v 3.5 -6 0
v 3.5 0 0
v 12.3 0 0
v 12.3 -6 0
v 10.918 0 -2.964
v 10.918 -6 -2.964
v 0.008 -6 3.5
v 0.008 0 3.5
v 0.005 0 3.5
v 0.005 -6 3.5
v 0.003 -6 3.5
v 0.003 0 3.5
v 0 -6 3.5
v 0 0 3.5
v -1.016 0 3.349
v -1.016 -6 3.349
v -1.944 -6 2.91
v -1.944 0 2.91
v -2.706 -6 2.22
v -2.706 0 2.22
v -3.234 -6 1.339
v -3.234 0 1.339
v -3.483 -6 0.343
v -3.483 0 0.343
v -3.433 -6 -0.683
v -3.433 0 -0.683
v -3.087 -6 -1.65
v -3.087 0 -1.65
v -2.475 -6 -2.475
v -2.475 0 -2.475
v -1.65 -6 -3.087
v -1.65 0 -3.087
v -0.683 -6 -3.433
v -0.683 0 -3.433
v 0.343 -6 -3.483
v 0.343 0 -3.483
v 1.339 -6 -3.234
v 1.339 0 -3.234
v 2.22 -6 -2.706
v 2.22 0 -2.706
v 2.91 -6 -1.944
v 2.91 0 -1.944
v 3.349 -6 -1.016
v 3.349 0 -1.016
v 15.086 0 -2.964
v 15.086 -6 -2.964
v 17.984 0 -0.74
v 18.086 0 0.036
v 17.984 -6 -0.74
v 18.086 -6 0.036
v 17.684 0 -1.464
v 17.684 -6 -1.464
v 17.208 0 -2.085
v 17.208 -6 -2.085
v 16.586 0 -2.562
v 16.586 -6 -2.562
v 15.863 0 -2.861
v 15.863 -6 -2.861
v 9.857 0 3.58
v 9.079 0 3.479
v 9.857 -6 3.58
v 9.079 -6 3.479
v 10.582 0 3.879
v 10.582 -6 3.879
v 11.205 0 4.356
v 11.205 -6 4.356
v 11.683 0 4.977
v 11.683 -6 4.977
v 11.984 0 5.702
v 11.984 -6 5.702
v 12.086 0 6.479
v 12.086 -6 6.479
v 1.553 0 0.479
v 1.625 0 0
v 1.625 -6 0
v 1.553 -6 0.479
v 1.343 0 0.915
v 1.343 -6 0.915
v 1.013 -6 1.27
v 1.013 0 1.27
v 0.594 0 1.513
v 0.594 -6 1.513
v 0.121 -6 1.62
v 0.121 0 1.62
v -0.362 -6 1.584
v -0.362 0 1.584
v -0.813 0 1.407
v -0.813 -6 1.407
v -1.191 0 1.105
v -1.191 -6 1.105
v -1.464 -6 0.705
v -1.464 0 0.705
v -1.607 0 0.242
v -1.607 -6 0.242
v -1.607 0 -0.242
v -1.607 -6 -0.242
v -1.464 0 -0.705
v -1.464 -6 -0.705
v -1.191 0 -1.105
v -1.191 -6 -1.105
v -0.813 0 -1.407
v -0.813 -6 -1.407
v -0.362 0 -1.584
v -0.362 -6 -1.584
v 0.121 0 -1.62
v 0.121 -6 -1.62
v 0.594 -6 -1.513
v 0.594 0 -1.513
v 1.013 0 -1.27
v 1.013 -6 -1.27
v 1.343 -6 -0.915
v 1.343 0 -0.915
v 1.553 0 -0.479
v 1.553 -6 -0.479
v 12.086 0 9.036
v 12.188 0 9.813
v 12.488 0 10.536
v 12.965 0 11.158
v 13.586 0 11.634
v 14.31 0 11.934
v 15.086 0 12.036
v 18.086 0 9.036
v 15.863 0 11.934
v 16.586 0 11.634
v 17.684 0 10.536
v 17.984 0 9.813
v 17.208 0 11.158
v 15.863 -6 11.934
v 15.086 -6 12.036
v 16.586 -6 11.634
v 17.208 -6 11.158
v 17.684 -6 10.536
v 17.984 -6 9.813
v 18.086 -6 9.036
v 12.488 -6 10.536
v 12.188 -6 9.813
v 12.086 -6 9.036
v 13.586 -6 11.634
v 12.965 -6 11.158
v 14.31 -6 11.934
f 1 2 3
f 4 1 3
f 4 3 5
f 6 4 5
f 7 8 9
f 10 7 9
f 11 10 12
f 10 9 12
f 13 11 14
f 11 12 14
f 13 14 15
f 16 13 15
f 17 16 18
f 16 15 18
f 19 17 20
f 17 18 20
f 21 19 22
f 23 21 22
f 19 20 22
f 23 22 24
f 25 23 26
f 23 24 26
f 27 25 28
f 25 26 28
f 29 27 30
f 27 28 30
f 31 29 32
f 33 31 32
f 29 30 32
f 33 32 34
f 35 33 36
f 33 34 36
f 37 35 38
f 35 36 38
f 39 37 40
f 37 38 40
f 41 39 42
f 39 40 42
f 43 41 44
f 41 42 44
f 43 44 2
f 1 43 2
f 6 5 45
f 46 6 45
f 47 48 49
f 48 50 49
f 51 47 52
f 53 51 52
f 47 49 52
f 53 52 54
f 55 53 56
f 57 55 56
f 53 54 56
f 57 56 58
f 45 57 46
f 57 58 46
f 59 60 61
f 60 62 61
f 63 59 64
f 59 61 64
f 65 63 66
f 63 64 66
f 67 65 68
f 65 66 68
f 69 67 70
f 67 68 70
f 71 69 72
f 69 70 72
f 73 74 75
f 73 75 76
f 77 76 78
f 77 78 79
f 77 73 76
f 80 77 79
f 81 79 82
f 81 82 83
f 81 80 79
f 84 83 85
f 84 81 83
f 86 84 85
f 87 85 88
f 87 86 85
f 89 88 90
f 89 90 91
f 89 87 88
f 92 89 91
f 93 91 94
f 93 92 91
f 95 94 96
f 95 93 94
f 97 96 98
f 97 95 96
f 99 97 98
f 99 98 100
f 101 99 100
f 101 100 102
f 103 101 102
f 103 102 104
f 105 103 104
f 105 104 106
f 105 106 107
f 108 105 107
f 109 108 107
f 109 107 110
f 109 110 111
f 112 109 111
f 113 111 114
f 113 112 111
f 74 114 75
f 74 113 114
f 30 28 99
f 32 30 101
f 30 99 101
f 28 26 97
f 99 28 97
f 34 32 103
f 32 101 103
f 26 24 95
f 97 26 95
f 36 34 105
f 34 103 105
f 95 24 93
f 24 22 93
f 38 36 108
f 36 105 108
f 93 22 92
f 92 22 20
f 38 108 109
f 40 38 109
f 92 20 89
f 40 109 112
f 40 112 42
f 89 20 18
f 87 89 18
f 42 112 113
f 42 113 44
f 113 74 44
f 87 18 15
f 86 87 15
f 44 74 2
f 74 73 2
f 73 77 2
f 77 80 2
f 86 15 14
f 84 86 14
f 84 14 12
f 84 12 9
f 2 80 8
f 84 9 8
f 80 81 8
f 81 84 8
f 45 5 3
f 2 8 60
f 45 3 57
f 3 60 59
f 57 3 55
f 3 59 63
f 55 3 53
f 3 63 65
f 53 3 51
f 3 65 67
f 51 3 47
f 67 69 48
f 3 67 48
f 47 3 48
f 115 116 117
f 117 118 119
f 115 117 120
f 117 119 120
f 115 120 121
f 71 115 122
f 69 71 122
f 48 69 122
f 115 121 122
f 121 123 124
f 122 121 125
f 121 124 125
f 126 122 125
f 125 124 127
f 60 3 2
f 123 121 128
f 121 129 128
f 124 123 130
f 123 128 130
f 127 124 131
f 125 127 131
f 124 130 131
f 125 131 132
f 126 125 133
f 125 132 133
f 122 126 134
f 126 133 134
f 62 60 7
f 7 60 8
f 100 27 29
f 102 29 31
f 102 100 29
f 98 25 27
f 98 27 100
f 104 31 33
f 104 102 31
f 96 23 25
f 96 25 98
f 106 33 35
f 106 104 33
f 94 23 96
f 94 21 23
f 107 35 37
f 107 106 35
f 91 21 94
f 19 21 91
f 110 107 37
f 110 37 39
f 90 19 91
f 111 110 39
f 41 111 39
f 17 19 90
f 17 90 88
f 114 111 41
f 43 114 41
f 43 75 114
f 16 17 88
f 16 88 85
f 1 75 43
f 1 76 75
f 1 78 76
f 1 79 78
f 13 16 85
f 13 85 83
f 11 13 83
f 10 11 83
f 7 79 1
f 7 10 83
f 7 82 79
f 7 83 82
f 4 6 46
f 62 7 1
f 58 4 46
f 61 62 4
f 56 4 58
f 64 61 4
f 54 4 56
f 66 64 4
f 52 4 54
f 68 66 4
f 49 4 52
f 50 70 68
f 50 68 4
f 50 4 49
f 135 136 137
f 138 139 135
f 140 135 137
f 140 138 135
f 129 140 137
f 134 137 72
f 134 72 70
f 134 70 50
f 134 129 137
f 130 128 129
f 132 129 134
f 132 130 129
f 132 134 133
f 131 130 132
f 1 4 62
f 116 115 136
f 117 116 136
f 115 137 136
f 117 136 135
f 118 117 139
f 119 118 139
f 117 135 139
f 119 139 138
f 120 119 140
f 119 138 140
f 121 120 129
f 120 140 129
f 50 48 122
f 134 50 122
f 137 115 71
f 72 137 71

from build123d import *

# Parameters (mm, degrees)
F0_R     = 1.625
F1_DEPTH = 6
F2_R     = 2.99999


# Not quite as in the source:
# - a fillet or chamfer is up to 0.001 mm smaller than in the source, because OpenCascade refuses the exact size


with BuildPart() as f1:
    # F0 (on Front) → F1 (new body)
    with BuildSketch(Plane.XZ):
        with BuildLine():
            Line((12.0862172917, 3.4724390134), (0.0079838936, 3.4999908939))
            ThreePointArc((0.0079838936, 3.4999908939), (0.0039919494, 3.4999977235), (0, 3.5))
            ThreePointArc((0, 3.5), (-2.4748737342, -2.4748737342), (3.5, 0))
            Line((3.5, 0), (12.3, 0))
            Line((12.3, 0), (10.9180201011, -2.9636654571))
            Line((10.9180201011, -2.9636654571), (18.0862172917, -2.9636654571))
            Line((18.0862172917, -2.9636654571), (18.0862172917, 12.0363345429))
            Line((18.0862172917, 12.0363345429), (12.0862172917, 12.0363345429))
            Line((12.0862172917, 12.0363345429), (12.0862172917, 3.4724390134))
        make_face()
        Circle(F0_R, mode=Mode.SUBTRACT)
    extrude(amount=F1_DEPTH)

    # F2 (radius 3 in the source; OpenCascade refuses exactly that, so slightly less here)
    f2_edges = [f1.edges().sort_by_distance(p)[0] for p in [
        (12.086217, -3, 12.036335),
        (12.086217, -3, 3.472439),
        (18.086217, -3, 12.036335),
        (18.086217, -3, -2.963665),
    ]]
    fillet(f2_edges, radius=F2_R)


solid = f1.part
